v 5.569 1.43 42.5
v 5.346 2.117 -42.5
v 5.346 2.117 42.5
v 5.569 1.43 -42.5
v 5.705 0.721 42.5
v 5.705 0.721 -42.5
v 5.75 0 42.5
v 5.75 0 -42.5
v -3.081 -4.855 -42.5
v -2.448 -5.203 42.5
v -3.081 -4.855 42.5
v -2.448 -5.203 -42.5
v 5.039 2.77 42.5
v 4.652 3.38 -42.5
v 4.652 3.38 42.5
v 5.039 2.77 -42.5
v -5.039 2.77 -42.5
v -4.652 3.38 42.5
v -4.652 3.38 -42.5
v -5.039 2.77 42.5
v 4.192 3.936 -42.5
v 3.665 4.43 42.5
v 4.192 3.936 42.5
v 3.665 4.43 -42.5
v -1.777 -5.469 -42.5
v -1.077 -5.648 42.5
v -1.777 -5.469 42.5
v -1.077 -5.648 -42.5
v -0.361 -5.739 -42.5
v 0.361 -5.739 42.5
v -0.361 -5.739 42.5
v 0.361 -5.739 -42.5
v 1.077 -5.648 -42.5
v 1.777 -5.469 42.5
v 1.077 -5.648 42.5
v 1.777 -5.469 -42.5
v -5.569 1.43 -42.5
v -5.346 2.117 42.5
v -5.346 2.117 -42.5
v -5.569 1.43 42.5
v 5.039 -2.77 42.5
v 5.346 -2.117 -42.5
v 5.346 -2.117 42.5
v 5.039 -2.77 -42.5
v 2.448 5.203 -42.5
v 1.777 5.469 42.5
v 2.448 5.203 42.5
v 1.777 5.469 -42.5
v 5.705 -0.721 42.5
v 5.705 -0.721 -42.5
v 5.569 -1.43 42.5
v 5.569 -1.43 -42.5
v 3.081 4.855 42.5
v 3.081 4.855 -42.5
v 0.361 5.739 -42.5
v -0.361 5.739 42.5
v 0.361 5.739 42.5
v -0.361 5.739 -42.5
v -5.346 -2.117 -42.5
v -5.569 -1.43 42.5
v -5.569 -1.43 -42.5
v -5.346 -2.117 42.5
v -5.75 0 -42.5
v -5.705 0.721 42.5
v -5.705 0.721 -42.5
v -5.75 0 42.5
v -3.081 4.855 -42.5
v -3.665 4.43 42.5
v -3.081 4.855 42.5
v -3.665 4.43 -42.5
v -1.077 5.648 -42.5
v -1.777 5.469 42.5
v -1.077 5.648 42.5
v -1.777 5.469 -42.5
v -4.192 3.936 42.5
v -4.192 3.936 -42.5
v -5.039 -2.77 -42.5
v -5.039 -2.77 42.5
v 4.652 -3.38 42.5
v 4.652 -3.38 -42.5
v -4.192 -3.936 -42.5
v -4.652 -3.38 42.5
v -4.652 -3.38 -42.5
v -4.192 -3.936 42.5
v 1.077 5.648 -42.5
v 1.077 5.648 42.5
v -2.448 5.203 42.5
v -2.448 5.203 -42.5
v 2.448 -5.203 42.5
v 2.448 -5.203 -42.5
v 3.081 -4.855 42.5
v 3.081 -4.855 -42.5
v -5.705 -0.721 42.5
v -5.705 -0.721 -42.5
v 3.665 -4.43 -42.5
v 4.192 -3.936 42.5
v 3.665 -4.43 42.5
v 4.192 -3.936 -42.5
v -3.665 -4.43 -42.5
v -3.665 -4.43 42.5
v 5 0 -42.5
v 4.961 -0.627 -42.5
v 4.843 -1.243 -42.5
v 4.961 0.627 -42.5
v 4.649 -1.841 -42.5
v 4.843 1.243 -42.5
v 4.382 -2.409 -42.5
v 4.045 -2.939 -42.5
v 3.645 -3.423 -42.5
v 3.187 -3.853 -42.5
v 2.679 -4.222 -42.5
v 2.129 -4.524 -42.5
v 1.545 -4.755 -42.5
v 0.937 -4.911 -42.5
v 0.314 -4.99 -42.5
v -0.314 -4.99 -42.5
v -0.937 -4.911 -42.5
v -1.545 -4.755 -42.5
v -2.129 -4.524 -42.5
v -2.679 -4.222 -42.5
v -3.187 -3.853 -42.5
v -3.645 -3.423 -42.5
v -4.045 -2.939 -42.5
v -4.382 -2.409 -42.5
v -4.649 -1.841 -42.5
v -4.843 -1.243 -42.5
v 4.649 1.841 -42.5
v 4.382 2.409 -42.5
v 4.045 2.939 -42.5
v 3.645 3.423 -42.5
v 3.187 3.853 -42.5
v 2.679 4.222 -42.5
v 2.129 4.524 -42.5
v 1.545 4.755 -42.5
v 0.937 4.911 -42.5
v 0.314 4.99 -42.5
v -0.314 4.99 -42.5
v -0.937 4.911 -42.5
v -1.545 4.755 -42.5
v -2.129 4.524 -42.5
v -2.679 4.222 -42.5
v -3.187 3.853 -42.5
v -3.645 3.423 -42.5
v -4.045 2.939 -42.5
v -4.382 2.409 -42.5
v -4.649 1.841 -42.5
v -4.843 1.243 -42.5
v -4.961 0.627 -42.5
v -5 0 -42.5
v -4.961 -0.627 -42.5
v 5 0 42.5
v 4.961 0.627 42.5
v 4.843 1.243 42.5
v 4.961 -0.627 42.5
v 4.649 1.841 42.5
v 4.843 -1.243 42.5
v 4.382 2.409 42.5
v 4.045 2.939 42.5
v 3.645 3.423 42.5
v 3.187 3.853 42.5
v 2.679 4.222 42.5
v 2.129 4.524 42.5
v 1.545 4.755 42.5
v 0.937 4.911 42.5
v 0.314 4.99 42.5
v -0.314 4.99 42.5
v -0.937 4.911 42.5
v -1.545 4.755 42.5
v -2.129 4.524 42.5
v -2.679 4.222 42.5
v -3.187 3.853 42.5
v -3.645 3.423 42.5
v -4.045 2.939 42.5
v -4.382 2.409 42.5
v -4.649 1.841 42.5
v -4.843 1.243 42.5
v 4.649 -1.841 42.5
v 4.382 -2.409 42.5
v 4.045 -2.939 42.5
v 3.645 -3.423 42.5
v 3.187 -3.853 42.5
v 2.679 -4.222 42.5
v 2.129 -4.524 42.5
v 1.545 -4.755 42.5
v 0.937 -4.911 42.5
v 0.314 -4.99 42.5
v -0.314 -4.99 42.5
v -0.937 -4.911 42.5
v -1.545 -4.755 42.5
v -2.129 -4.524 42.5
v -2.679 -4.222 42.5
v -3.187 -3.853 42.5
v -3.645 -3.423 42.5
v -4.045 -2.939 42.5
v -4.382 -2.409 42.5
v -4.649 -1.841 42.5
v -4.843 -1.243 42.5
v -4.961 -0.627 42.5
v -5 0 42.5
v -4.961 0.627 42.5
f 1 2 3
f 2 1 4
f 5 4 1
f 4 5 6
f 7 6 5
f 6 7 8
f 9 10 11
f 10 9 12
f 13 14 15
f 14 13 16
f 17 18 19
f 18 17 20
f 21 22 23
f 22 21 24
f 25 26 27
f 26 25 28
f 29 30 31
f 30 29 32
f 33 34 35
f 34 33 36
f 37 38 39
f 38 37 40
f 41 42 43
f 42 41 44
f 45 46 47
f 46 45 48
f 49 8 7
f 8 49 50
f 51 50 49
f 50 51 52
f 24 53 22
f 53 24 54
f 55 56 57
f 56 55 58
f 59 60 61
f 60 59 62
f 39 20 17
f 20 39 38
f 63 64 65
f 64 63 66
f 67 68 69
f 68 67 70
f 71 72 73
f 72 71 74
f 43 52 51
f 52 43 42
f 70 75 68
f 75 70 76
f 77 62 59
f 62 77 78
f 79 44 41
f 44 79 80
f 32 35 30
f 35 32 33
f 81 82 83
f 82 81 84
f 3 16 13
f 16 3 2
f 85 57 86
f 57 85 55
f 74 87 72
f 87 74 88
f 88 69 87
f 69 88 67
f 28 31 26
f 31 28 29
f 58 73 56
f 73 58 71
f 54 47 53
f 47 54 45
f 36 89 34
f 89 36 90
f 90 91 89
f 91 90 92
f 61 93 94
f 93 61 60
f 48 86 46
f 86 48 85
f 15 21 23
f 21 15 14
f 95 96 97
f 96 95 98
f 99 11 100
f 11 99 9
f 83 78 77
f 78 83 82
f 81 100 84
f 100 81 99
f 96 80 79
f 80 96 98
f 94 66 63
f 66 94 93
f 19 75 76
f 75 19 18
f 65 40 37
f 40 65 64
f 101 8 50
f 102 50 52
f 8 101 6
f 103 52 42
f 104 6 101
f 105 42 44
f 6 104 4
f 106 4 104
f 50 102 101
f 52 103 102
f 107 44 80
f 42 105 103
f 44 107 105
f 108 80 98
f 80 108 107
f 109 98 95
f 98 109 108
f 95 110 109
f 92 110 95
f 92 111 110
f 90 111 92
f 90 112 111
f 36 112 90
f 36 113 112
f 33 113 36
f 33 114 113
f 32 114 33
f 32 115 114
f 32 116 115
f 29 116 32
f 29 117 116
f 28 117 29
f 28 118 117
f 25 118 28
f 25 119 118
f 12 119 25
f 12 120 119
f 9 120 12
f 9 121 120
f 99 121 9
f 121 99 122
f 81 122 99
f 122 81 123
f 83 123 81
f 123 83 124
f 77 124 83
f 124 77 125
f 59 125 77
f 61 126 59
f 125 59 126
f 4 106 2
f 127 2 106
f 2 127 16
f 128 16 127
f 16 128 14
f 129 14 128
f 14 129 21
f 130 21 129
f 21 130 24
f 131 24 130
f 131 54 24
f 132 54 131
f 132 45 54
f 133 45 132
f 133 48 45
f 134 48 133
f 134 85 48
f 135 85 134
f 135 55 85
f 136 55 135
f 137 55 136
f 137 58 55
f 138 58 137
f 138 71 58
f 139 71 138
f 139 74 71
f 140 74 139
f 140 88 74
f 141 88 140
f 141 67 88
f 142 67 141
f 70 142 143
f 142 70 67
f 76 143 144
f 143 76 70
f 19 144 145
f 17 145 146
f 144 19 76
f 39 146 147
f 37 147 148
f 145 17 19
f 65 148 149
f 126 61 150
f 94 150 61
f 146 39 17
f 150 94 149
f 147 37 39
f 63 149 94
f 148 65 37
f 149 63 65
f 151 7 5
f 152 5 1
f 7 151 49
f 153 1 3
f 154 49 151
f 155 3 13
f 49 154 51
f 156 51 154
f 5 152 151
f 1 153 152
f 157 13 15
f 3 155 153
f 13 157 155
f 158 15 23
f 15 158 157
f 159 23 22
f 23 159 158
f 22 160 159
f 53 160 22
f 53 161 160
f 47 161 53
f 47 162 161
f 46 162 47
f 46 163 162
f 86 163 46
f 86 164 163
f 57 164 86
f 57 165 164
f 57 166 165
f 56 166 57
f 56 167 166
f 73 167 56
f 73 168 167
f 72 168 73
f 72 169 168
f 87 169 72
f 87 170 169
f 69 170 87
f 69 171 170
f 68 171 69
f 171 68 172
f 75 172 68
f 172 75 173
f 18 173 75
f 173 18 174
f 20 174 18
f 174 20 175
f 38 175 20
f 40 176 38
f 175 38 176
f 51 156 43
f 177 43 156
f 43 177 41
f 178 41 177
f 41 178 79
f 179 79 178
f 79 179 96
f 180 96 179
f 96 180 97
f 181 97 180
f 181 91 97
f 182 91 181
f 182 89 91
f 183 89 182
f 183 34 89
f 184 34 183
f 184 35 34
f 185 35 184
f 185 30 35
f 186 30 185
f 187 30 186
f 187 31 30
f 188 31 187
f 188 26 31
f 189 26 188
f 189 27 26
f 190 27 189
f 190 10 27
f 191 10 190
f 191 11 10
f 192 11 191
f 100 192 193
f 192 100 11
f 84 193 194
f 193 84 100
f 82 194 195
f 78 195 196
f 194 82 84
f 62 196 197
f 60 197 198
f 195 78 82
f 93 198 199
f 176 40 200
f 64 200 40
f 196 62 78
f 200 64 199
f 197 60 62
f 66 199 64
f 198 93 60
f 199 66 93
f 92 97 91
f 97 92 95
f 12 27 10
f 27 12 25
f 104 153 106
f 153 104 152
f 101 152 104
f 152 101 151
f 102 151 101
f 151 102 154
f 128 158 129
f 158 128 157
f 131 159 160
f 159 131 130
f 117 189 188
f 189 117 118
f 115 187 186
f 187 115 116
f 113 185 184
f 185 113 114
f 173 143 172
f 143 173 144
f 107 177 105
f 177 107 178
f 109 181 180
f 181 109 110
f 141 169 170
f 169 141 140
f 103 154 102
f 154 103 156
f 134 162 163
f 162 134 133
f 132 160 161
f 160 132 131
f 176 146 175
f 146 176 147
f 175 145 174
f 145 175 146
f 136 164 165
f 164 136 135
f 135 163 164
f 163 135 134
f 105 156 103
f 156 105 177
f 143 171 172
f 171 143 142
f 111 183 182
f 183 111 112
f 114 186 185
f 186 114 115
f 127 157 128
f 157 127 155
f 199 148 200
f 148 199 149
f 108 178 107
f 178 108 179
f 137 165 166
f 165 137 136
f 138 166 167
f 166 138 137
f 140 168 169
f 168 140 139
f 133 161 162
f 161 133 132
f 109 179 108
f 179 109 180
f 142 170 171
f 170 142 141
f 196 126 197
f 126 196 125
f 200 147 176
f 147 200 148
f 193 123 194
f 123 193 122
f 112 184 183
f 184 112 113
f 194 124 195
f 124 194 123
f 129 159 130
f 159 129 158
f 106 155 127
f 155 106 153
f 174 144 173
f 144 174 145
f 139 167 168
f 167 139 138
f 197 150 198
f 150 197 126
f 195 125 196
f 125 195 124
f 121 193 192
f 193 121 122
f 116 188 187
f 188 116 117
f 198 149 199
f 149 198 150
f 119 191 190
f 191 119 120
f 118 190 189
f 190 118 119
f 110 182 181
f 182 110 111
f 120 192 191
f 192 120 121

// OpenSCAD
$fn = 50;


difference() {
	union() {
		translate(v = [0, 0, -42.5000000000]) {
			cylinder(h = 85, r = 5.7500000000);
		}
	}
	union() {
		translate(v = [0, 0, -100.0000000000]) {
			cylinder(h = 200, r = 5.0000000000);
		}
	}
}
